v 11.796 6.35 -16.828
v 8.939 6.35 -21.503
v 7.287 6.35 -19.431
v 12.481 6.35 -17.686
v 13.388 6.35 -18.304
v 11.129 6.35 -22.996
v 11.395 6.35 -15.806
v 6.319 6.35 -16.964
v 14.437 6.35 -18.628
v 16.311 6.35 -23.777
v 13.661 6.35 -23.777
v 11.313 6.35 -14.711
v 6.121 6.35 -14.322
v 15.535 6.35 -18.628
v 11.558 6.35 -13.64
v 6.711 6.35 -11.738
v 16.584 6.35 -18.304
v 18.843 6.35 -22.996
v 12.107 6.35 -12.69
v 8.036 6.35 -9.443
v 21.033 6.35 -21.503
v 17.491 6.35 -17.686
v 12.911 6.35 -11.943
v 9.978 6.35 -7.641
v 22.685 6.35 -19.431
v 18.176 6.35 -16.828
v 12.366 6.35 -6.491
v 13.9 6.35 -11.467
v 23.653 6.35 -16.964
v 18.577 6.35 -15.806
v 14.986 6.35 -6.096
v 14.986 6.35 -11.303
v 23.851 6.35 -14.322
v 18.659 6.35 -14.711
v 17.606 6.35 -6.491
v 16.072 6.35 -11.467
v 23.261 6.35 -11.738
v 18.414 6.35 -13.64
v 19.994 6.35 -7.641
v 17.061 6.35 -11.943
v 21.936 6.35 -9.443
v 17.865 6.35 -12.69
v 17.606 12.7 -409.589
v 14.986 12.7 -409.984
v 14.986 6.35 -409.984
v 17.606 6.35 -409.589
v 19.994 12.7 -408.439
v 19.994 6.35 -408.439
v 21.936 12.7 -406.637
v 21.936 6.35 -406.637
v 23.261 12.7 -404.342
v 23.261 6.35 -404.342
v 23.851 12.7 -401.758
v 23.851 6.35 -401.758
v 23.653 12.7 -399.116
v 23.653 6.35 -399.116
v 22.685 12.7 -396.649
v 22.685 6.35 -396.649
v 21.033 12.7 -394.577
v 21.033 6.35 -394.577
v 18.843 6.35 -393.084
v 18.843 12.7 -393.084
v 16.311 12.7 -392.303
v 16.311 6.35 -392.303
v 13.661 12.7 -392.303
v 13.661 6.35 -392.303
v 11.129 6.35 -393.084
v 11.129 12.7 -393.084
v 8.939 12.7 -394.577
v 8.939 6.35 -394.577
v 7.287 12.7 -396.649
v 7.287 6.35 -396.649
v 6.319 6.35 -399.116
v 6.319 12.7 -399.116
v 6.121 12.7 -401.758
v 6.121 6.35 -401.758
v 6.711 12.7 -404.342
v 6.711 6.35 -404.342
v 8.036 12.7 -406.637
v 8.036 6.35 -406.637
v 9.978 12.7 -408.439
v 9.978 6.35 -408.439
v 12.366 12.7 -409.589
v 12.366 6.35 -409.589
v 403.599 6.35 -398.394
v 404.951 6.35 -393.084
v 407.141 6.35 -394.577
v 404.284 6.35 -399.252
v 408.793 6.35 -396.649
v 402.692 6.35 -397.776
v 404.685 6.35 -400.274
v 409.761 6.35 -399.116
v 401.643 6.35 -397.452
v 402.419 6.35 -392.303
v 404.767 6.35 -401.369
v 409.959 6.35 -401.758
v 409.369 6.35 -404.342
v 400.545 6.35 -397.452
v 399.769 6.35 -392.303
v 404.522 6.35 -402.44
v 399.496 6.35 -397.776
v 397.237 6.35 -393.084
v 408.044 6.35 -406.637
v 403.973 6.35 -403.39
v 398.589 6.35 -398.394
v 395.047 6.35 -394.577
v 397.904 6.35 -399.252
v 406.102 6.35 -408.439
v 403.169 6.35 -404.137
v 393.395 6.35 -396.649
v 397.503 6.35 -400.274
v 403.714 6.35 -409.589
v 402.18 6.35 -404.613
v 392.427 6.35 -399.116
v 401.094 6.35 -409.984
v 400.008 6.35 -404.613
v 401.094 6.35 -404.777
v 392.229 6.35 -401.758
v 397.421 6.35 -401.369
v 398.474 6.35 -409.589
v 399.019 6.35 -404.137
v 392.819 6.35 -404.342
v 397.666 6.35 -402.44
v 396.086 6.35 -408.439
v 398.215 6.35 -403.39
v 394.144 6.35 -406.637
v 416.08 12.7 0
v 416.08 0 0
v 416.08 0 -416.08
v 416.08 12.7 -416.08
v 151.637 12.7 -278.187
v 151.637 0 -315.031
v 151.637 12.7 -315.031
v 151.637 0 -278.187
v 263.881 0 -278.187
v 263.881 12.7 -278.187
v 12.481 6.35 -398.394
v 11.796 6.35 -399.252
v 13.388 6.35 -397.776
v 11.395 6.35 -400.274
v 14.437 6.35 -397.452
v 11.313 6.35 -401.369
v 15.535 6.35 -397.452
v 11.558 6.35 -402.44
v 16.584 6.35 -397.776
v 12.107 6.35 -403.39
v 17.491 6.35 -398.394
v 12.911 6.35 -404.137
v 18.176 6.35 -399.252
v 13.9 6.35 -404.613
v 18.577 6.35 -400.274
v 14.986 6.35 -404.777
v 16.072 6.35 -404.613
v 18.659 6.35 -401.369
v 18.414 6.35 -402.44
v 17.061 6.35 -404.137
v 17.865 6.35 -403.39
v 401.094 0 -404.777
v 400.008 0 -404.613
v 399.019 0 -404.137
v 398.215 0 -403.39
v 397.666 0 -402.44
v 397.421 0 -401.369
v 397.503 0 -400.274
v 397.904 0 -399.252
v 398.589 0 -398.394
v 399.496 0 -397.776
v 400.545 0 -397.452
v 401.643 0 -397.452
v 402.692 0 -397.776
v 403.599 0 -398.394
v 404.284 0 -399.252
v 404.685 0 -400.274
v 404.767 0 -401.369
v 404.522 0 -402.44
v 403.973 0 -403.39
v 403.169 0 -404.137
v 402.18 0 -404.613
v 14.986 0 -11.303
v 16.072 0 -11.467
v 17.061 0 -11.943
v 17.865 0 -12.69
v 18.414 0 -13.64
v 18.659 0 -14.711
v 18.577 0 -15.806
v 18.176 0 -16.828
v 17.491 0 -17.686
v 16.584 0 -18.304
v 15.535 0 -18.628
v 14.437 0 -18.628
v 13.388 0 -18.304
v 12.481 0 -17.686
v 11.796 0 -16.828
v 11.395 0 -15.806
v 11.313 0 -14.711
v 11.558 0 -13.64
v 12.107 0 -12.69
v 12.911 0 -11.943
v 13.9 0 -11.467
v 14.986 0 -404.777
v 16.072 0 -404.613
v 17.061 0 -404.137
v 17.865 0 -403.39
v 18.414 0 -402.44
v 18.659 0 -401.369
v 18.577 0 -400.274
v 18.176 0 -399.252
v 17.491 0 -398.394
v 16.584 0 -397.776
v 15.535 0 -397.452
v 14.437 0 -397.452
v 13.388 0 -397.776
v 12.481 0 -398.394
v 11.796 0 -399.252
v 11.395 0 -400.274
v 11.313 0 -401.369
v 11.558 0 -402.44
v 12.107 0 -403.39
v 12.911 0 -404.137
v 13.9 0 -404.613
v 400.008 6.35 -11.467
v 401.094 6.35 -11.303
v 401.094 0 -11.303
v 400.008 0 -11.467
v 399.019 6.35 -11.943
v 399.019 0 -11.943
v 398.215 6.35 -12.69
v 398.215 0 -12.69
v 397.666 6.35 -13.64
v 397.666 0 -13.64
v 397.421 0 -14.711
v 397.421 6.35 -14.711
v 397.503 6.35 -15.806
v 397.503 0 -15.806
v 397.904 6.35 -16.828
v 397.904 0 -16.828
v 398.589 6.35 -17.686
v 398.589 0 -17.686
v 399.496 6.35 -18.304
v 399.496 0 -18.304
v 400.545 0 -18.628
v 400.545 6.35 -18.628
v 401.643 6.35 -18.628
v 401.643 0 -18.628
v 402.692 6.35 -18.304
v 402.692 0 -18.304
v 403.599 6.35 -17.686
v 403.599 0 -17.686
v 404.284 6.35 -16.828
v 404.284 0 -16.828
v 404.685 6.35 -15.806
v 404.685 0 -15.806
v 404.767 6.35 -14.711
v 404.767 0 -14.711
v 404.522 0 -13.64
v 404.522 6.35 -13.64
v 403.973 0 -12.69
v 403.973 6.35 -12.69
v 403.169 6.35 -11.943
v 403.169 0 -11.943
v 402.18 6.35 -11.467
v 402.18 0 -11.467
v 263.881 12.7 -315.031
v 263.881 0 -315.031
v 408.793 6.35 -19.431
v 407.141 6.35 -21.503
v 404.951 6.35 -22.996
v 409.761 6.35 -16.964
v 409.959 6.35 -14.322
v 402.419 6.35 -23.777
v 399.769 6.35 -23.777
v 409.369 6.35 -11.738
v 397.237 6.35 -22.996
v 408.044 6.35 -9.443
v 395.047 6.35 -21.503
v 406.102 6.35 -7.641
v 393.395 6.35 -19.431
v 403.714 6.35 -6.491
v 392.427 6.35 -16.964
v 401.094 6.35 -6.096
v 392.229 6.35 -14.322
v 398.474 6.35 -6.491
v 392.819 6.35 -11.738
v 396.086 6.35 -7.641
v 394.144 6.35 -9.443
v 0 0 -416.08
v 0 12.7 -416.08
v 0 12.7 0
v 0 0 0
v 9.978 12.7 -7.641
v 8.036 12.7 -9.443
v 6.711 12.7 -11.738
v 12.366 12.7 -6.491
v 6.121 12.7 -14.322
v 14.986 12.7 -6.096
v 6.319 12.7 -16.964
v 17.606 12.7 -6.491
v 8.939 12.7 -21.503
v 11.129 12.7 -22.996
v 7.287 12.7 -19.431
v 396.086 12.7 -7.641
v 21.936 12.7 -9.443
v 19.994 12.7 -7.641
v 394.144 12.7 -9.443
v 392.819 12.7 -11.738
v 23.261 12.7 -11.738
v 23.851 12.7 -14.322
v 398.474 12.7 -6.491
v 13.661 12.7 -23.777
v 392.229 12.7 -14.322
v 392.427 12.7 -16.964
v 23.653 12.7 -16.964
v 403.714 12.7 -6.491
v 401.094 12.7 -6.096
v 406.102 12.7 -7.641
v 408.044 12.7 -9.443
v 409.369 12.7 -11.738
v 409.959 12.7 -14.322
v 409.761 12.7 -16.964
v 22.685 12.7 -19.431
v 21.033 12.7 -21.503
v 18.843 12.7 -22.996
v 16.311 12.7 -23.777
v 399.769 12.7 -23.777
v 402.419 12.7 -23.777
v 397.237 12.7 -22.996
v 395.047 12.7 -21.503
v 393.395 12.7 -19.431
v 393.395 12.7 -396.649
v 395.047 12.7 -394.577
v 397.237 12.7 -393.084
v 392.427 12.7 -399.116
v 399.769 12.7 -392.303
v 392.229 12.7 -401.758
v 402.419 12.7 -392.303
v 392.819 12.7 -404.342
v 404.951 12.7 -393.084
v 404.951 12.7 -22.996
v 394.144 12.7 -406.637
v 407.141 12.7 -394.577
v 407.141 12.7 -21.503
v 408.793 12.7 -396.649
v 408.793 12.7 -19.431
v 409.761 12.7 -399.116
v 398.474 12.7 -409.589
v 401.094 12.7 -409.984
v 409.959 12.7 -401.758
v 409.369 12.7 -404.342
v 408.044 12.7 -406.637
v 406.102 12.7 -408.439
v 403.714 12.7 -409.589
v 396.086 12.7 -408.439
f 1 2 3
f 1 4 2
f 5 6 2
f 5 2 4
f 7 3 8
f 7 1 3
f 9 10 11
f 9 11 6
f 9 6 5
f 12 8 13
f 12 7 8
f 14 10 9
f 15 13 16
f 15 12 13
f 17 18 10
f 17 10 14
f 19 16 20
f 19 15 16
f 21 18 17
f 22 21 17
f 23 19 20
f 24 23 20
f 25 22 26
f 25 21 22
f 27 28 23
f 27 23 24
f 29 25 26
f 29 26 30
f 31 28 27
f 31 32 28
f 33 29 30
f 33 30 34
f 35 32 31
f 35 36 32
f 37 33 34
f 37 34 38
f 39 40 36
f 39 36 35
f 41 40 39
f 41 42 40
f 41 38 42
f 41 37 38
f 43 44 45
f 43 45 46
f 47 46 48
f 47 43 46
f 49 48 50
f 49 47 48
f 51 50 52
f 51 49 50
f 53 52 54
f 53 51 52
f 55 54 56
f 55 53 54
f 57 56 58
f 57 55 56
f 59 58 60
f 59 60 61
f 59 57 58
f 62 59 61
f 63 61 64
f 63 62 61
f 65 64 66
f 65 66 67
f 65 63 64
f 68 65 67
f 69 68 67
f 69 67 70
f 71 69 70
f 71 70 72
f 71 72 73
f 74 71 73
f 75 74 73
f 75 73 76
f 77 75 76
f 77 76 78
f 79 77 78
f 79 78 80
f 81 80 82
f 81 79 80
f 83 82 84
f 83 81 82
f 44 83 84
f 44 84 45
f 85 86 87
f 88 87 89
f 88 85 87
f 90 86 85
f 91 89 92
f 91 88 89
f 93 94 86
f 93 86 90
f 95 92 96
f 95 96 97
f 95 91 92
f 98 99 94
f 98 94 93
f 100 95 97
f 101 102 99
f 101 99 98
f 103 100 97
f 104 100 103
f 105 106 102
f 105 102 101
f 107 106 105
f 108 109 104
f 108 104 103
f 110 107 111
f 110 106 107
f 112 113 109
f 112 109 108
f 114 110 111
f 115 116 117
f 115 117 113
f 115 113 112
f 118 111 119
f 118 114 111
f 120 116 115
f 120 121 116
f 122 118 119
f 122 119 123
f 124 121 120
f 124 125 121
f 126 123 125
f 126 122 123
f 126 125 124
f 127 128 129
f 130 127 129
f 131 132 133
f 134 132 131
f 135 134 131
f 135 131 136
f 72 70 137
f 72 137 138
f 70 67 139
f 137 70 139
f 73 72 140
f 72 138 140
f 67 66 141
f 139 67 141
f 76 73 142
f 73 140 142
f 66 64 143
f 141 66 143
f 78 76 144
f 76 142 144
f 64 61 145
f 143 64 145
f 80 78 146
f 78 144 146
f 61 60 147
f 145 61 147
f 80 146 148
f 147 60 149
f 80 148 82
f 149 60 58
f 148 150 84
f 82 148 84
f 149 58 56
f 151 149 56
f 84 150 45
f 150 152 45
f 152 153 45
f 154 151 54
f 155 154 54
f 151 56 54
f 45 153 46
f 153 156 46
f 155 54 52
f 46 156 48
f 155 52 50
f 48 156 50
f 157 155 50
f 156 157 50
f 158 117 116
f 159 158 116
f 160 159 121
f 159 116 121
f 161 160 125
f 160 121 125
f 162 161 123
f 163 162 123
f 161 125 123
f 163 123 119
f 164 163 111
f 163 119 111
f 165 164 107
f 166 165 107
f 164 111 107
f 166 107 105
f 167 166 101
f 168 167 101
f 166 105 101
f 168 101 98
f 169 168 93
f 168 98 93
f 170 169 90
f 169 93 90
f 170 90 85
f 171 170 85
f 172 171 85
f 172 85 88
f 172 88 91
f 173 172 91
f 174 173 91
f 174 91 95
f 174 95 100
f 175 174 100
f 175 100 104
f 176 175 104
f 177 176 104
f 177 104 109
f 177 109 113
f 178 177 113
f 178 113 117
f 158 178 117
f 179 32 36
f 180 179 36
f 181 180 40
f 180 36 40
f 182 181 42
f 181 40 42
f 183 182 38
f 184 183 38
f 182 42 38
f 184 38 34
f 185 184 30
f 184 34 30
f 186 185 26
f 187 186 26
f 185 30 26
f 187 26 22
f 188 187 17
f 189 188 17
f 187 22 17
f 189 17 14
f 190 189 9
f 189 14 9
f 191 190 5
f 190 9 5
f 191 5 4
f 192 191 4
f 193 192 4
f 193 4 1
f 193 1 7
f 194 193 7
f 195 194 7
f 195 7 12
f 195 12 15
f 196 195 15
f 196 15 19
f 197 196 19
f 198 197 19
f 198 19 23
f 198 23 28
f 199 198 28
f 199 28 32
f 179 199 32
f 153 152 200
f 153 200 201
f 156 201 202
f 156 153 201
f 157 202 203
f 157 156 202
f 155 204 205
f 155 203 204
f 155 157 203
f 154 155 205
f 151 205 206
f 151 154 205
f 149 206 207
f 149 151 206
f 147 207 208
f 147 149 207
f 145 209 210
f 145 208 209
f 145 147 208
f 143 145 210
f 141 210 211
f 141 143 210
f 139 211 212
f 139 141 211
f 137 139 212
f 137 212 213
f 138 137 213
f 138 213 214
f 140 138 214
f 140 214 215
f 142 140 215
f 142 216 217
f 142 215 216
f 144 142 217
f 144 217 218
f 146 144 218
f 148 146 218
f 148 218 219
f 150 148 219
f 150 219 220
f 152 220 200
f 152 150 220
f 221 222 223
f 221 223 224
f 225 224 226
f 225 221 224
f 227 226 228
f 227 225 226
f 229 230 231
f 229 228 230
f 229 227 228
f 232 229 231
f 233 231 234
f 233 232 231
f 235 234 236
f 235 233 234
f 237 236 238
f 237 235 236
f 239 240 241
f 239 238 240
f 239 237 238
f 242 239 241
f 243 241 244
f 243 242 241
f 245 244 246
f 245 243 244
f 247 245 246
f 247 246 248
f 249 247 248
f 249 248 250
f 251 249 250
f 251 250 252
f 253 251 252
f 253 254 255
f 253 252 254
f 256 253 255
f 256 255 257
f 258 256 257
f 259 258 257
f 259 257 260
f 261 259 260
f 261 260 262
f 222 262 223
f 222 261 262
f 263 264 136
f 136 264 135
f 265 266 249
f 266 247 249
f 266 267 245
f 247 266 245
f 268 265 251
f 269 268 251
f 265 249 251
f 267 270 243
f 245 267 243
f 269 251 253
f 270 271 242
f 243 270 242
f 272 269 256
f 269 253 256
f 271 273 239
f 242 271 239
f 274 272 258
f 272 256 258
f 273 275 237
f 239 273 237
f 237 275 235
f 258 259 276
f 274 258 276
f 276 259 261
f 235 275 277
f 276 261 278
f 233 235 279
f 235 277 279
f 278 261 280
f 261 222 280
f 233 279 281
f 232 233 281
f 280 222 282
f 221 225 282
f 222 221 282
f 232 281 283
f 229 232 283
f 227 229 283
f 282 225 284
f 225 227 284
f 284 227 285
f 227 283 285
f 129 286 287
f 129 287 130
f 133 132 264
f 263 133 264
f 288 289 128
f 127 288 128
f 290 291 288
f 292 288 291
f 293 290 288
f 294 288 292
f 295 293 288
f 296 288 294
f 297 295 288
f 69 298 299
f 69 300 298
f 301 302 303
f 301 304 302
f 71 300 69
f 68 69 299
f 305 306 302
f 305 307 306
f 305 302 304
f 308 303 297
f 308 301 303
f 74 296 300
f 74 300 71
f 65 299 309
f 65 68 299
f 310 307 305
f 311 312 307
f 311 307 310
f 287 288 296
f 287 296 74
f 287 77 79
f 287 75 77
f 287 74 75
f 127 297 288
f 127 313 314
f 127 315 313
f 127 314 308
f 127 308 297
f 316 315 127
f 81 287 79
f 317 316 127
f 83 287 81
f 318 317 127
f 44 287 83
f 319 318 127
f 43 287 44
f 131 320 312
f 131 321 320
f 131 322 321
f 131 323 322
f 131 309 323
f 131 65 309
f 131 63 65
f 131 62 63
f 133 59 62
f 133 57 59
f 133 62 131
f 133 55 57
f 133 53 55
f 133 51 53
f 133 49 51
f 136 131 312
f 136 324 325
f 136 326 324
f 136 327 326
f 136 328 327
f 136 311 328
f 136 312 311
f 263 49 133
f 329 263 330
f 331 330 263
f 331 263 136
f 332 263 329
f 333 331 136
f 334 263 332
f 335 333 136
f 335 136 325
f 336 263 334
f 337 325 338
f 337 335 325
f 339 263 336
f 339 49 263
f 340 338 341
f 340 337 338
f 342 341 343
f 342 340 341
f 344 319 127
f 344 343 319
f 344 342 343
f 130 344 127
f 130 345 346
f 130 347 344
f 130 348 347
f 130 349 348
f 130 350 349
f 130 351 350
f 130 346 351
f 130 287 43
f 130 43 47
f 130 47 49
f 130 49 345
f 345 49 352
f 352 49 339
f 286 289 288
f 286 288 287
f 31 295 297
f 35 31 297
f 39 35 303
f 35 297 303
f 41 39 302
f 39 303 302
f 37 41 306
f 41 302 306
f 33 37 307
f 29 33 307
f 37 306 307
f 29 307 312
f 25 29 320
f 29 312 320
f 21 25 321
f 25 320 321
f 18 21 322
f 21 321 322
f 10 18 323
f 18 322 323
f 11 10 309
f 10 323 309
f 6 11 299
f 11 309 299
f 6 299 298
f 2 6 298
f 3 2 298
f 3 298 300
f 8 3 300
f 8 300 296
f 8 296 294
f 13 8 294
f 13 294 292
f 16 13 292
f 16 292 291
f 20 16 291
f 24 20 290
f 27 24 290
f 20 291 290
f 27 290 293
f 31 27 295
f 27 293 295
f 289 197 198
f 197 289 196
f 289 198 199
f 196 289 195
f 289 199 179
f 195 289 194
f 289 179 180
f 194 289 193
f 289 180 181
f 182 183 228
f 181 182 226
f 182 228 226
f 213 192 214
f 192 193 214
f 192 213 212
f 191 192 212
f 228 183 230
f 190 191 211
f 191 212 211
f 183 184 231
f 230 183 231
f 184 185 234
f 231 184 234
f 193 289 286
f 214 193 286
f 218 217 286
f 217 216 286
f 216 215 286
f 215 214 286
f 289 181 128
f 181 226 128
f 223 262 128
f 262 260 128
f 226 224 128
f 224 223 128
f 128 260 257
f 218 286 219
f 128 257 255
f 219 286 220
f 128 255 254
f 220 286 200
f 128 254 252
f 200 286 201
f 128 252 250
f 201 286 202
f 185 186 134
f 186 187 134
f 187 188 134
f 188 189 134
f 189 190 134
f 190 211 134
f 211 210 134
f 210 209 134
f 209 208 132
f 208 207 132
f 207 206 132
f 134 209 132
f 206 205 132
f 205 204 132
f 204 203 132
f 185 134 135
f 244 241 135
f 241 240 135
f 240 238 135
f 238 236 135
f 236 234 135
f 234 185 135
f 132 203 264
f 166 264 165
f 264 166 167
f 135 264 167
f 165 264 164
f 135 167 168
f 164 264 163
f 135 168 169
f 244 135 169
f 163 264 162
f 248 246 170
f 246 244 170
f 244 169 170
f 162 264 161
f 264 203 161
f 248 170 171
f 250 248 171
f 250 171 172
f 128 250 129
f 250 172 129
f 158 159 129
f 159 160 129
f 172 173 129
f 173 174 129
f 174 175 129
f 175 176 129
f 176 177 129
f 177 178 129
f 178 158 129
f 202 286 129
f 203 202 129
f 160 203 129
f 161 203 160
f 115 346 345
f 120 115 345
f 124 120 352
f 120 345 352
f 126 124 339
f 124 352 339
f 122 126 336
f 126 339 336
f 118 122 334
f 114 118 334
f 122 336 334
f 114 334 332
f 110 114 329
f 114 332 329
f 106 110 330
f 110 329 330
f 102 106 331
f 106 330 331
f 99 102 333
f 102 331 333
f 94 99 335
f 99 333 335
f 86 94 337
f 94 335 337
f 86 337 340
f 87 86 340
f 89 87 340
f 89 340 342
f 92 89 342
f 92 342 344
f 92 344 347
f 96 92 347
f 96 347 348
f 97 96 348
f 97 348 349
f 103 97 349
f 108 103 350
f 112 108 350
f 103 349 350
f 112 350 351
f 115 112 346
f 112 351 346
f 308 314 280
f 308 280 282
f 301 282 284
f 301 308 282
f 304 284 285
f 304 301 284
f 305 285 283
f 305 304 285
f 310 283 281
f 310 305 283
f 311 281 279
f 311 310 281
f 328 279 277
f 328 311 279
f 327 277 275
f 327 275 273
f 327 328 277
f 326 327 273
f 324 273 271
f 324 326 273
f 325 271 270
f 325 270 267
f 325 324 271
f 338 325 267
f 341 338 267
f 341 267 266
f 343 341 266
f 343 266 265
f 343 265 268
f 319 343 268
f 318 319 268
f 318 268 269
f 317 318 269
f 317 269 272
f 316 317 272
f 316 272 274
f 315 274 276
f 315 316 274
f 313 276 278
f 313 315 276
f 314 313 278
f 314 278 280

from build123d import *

# Parameters (mm, degrees)
SKETCH1_W                                  = 416.08
SKETCH1_H                                  = 416.08
BOSS_EXTRUDE1_DEPTH                        = 12.7
SKETCH2_R                                  = 3.683
CUT_EXTRUDE1_DEPTH                         = 589.563015148
SKETCH3_R                                  = 8.89
CUT_EXTRUDE2_DEPTH                         = 6.35
MIRROR1_AT_THE_SECOND_PLANE_COPY_1_SKETC_R = 3.683
MIRROR1_AT_THE_SECOND_PLANE_COPY_1_DEPTH   = 589.563015148
MIRROR1_AT_THE_SECOND_PLANE_COPY_2_SKETC_R = 8.89
MIRROR1_AT_THE_SECOND_PLANE_COPY_2_DEPTH   = 6.35
CUT_EXTRUDE3_REACH                         = 590.563
SKETCH4_W                                  = 112.243977319
SKETCH4_H                                  = 36.843442936


with BuildPart() as part:
    # Sketch1 → Boss-Extrude1 (new body)
    with BuildSketch(Plane(origin=(0, 0, 0), x_dir=(1, 0, 0), z_dir=(0, 1, 0))):
        with Locations((208.04, 208.04)):
            Rectangle(SKETCH1_W, SKETCH1_H)
    extrude(amount=BOSS_EXTRUDE1_DEPTH)

    # Sketch2 → Cut-Extrude1 (cut, through all)
    with BuildSketch(Plane(origin=(0, 12.7, 0), x_dir=(1, 0, 0), z_dir=(0, 1, 0))):
        with Locations(Location((14.986, 14.986, 0), (0, 0, 270))):
            Circle(SKETCH2_R)
    cut_extrude1 = extrude(amount=-CUT_EXTRUDE1_DEPTH, mode=Mode.SUBTRACT)

    # Sketch3 → Cut-Extrude2 (cut, symmetric)
    with BuildSketch(Plane(origin=(0, 12.7, 0), x_dir=(1, 0, 0), z_dir=(0, 1, 0))):
        with Locations(Location((14.986, 14.986, 0), (0, 0, 270))):
            Circle(SKETCH3_R)
    cut_extrude2 = extrude(amount=CUT_EXTRUDE2_DEPTH, both=True, mode=Mode.SUBTRACT)

    # Mirror1: Cut-Extrude1, Cut-Extrude2 across plane
    add(cut_extrude1.mirror(Plane(origin=(0, 0, -208.04), x_dir=(1, 0, 0), z_dir=(0, 0, -1))), mode=Mode.SUBTRACT)
    add(cut_extrude2.mirror(Plane(origin=(0, 0, -208.04), x_dir=(1, 0, 0), z_dir=(0, 0, -1))), mode=Mode.SUBTRACT)

    # Mirror1 at the second plane: Cut-Extrude1, Cut-Extrude2 across plane
    add(cut_extrude1.mirror(Plane.ZY.offset(-208.04)), mode=Mode.SUBTRACT)
    add(cut_extrude2.mirror(Plane.ZY.offset(-208.04)), mode=Mode.SUBTRACT)

    # Mirror1 at the second plane copy 1 sketc → Mirror1 at the second plane copy 1 (cut, through all)
    with BuildSketch(Plane(origin=(416.08, 12.7, -416.08), x_dir=(-1, 0, 0), z_dir=(0, 1, 0))):
        with Locations(Location((14.986, 14.986, 0), (0, 0, 270))):
            Circle(MIRROR1_AT_THE_SECOND_PLANE_COPY_1_SKETC_R)
    extrude(amount=-MIRROR1_AT_THE_SECOND_PLANE_COPY_1_DEPTH, mode=Mode.SUBTRACT)

    # Mirror1 at the second plane copy 2 sketc → Mirror1 at the second plane copy 2 (cut, symmetric)
    with BuildSketch(Plane(origin=(416.08, 12.7, -416.08), x_dir=(-1, 0, 0), z_dir=(0, 1, 0))):
        with Locations(Location((14.986, 14.986, 0), (0, 0, 270))):
            Circle(MIRROR1_AT_THE_SECOND_PLANE_COPY_2_SKETC_R)
    extrude(amount=MIRROR1_AT_THE_SECOND_PLANE_COPY_2_DEPTH, both=True, mode=Mode.SUBTRACT)

    # Sketch4 → Cut-Extrude3 (cut, up to next)
    with BuildSketch(Plane.XZ, mode=Mode.PRIVATE) as cut_extrude3_sk1:
        with Locations((207.758599761, -296.609069082)):
            Rectangle(SKETCH4_W, SKETCH4_H)
    cut_extrude3_tool1 = extrude(cut_extrude3_sk1.sketch, amount=-CUT_EXTRUDE3_REACH, mode=Mode.PRIVATE) & part.part
    add(cut_extrude3_tool1.solids().sort_by_distance((207.7586, 0, -296.609069))[0], mode=Mode.SUBTRACT)


solid = part.part
